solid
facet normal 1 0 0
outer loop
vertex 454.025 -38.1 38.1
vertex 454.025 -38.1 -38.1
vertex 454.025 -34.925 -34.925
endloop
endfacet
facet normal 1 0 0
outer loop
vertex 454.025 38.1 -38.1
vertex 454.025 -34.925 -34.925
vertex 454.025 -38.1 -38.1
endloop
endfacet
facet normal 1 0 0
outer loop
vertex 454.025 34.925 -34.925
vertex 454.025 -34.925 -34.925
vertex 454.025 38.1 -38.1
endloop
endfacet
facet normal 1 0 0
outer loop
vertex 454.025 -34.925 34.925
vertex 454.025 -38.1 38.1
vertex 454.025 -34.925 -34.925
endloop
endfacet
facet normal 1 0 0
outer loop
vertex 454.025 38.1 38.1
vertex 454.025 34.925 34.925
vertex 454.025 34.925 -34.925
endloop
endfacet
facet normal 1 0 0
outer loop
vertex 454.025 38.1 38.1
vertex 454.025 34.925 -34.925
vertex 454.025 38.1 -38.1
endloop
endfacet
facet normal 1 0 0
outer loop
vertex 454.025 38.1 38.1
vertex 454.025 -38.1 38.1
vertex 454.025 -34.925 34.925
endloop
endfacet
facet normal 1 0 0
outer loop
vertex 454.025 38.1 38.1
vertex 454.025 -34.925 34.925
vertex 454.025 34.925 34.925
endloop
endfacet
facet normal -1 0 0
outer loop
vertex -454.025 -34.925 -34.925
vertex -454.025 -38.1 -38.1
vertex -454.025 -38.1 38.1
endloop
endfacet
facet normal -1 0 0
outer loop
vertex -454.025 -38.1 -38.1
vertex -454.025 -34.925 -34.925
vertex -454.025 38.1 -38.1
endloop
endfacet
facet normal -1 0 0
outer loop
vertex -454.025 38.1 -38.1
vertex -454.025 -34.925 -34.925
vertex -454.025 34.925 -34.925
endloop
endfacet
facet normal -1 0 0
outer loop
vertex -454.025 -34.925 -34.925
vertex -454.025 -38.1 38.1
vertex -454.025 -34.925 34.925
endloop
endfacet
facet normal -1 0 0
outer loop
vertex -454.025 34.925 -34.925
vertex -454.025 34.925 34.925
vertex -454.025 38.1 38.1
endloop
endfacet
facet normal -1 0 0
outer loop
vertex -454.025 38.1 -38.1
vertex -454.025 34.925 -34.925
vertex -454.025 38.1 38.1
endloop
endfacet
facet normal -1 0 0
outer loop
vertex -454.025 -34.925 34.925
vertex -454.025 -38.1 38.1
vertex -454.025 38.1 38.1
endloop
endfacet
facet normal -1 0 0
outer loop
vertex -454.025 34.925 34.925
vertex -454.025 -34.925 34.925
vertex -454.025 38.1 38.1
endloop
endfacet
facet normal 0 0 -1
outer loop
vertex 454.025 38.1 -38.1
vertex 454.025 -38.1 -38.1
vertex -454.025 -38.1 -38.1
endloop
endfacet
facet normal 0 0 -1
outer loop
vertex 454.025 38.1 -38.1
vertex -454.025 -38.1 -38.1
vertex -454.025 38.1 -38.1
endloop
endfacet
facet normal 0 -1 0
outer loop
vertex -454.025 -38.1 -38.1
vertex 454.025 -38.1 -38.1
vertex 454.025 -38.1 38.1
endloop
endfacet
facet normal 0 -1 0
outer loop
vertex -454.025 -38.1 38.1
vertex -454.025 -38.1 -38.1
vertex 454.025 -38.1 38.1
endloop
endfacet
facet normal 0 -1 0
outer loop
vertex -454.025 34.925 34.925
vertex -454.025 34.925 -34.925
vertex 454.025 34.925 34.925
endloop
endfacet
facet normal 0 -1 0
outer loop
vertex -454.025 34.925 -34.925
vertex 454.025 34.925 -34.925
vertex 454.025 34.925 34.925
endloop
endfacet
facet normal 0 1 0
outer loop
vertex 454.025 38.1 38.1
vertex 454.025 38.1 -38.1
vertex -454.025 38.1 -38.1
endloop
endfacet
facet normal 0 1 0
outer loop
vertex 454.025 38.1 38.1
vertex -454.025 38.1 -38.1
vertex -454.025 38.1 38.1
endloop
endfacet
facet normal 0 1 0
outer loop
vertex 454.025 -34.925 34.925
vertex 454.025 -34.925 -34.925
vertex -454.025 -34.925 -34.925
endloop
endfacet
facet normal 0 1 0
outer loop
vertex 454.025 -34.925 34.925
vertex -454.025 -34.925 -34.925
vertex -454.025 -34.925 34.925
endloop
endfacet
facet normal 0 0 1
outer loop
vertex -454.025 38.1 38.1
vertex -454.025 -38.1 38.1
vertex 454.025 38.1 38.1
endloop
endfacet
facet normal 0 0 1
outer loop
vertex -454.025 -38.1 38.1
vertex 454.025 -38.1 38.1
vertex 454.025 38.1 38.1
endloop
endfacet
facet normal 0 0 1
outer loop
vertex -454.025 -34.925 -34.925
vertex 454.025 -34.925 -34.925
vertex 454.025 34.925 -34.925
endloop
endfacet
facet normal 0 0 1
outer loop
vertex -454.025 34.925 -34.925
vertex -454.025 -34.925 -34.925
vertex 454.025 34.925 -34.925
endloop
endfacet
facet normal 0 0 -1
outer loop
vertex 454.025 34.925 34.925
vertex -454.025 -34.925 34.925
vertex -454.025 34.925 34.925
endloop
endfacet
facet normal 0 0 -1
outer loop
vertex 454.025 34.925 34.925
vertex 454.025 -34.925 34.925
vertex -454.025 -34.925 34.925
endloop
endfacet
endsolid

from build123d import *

# Parameters (mm, degrees)
F0_W          = 76.2
F0_H          = 76.2
F0_W_2        = 69.85
F0_H_2        = 69.85
F1_DEPTH      = 454.025
F1_DEPTH_BACK = 454.025


with BuildPart() as f1:
    # F0 (on Right) → F1 (new body, two sides)
    with BuildSketch(Plane.YZ) as f1_sk:
        Rectangle(F0_W, F0_H)
        Rectangle(F0_W_2, F0_H_2, mode=Mode.SUBTRACT)
    extrude(amount=F1_DEPTH)
    extrude(f1_sk.sketch, amount=-F1_DEPTH_BACK)


solid = f1.part
